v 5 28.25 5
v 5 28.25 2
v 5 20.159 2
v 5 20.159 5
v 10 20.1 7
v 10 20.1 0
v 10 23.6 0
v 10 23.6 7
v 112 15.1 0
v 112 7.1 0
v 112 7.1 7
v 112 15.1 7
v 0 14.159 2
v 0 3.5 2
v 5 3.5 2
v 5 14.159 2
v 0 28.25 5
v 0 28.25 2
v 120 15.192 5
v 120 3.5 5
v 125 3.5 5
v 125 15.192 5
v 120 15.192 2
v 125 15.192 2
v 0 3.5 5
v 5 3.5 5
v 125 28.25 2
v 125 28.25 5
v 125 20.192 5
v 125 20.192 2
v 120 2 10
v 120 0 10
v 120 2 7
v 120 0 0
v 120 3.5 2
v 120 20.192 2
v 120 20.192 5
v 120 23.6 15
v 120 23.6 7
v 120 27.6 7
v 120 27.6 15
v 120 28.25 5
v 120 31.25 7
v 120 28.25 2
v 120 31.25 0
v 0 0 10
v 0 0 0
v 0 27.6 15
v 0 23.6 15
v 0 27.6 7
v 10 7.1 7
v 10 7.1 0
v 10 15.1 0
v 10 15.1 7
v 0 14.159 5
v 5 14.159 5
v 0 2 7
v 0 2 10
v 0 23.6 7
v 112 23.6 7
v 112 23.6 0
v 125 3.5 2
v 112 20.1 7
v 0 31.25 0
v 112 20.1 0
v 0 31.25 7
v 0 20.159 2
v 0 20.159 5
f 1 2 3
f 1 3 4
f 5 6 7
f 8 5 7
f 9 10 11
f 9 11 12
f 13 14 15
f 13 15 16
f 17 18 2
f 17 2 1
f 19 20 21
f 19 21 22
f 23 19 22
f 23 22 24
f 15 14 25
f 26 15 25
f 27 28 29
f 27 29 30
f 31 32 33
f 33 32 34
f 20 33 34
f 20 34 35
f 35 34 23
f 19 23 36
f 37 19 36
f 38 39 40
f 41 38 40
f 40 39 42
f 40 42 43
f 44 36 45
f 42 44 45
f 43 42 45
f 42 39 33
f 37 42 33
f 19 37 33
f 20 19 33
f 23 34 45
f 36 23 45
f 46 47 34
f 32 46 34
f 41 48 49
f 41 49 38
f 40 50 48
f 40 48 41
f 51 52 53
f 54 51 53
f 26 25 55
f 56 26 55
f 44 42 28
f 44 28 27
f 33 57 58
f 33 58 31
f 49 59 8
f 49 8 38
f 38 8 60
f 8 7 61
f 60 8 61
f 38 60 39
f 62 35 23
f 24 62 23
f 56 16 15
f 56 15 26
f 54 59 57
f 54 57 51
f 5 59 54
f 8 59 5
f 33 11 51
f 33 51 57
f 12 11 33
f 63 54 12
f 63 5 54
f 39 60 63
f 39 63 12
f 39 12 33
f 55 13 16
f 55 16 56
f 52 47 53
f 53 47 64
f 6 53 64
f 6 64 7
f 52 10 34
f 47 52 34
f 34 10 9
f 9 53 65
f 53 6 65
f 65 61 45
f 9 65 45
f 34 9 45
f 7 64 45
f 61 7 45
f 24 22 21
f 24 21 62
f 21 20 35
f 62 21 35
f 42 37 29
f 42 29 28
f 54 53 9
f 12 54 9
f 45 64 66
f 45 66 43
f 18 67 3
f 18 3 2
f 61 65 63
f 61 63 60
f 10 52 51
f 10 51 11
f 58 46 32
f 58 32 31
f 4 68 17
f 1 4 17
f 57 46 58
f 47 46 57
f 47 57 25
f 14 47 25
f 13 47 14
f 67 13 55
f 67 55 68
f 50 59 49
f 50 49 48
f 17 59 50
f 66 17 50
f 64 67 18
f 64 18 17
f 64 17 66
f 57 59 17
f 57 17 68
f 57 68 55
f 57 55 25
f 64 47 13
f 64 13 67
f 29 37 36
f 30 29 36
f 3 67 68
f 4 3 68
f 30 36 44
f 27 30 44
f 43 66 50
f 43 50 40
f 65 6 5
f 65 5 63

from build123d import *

# Parameters (mm, degrees)
SKETCH1_W               = 120
SKETCH1_H               = 31.25
BOSS_EXTRUDE1_DEPTH     = 7
SKETCH2_W               = 120
SKETCH2_H               = 4
SKETCH2_H_2             = 2
BOSS_EXTRUDE2_DEPTH     = 8
CUT_EXTRUDE1_DEPTH      = 125.260059955
CUT_EXTRUDE1_DEPTH_BACK = 125.260059955
SKETCH3_W               = 102
SKETCH3_H               = 8
SKETCH3_H_2             = 3.5
CUT_EXTRUDE3_REACH      = 126.906
SKETCH6_W               = 5
SKETCH6_H               = 2
SKETCH4_W               = 3
SKETCH4_H               = 8.090611825
SKETCH4_H_2             = 10.659388175
CUT_EXTRUDE4_DEPTH      = 5
SKETCH5_W               = 3
SKETCH5_H               = 8.0580149
SKETCH5_H_2             = 11.6919851
BOSS_EXTRUDE3_DEPTH     = 5


with BuildPart() as part:
    # Sketch1 → Boss-Extrude1 (new body)
    with BuildSketch(Plane.XY):
        with Locations((60, 15.625)):
            Rectangle(SKETCH1_W, SKETCH1_H)
    extrude(amount=BOSS_EXTRUDE1_DEPTH)

    # Sketch2 → Boss-Extrude2 (add)
    with BuildSketch(Plane.XY.offset(7)):
        with Locations((60, 25.6)):
            Rectangle(SKETCH2_W, SKETCH2_H)
        with Locations((60, 1)):
            Rectangle(SKETCH2_W, SKETCH2_H_2)
    extrude(amount=BOSS_EXTRUDE2_DEPTH)

    # Sketch3 → Cut-Extrude1 (cut, two sides: drawn at the far end of the back side and taken through both)
    with BuildSketch(Plane.XY.offset(7).offset(-CUT_EXTRUDE1_DEPTH_BACK)):
        with Locations((61, 11.1)):
            Rectangle(SKETCH3_W, SKETCH3_H)
        with Locations((61, 21.85)):
            Rectangle(SKETCH3_W, SKETCH3_H_2)
    extrude(amount=CUT_EXTRUDE1_DEPTH + CUT_EXTRUDE1_DEPTH_BACK, mode=Mode.SUBTRACT)

    # Sketch6 → Cut-Extrude3 (cut, up to next)
    with BuildSketch(Plane.ZY, mode=Mode.PRIVATE) as cut_extrude3_sk1:
        with Locations((12.5, 1)):
            Rectangle(SKETCH6_W, SKETCH6_H)
    cut_extrude3_tool1 = extrude(cut_extrude3_sk1.sketch, amount=-CUT_EXTRUDE3_REACH, mode=Mode.PRIVATE) & part.part
    add(cut_extrude3_tool1.solids().sort_by_distance((0, 1, 12.5))[0], mode=Mode.SUBTRACT)

    # Sketch4 → Cut-Extrude4 (cut)
    with BuildSketch(Plane.ZY):
        with Locations((3.5, 24.204694088)):
            Rectangle(SKETCH4_W, SKETCH4_H)
        with Locations((3.5, 8.829694088)):
            Rectangle(SKETCH4_W, SKETCH4_H_2)
    extrude(amount=-CUT_EXTRUDE4_DEPTH, mode=Mode.SUBTRACT)

    # Sketch5 → Boss-Extrude3 (add)
    with BuildSketch(Plane(origin=(120, 0, 0), x_dir=(0, 0, -1), z_dir=(1, 0, 0))):
        with Locations((-3.5, 24.22099255)):
            Rectangle(SKETCH5_W, SKETCH5_H)
        with Locations((-3.5, 9.34599255)):
            Rectangle(SKETCH5_W, SKETCH5_H_2)
    extrude(amount=BOSS_EXTRUDE3_DEPTH)


solid = part.part
